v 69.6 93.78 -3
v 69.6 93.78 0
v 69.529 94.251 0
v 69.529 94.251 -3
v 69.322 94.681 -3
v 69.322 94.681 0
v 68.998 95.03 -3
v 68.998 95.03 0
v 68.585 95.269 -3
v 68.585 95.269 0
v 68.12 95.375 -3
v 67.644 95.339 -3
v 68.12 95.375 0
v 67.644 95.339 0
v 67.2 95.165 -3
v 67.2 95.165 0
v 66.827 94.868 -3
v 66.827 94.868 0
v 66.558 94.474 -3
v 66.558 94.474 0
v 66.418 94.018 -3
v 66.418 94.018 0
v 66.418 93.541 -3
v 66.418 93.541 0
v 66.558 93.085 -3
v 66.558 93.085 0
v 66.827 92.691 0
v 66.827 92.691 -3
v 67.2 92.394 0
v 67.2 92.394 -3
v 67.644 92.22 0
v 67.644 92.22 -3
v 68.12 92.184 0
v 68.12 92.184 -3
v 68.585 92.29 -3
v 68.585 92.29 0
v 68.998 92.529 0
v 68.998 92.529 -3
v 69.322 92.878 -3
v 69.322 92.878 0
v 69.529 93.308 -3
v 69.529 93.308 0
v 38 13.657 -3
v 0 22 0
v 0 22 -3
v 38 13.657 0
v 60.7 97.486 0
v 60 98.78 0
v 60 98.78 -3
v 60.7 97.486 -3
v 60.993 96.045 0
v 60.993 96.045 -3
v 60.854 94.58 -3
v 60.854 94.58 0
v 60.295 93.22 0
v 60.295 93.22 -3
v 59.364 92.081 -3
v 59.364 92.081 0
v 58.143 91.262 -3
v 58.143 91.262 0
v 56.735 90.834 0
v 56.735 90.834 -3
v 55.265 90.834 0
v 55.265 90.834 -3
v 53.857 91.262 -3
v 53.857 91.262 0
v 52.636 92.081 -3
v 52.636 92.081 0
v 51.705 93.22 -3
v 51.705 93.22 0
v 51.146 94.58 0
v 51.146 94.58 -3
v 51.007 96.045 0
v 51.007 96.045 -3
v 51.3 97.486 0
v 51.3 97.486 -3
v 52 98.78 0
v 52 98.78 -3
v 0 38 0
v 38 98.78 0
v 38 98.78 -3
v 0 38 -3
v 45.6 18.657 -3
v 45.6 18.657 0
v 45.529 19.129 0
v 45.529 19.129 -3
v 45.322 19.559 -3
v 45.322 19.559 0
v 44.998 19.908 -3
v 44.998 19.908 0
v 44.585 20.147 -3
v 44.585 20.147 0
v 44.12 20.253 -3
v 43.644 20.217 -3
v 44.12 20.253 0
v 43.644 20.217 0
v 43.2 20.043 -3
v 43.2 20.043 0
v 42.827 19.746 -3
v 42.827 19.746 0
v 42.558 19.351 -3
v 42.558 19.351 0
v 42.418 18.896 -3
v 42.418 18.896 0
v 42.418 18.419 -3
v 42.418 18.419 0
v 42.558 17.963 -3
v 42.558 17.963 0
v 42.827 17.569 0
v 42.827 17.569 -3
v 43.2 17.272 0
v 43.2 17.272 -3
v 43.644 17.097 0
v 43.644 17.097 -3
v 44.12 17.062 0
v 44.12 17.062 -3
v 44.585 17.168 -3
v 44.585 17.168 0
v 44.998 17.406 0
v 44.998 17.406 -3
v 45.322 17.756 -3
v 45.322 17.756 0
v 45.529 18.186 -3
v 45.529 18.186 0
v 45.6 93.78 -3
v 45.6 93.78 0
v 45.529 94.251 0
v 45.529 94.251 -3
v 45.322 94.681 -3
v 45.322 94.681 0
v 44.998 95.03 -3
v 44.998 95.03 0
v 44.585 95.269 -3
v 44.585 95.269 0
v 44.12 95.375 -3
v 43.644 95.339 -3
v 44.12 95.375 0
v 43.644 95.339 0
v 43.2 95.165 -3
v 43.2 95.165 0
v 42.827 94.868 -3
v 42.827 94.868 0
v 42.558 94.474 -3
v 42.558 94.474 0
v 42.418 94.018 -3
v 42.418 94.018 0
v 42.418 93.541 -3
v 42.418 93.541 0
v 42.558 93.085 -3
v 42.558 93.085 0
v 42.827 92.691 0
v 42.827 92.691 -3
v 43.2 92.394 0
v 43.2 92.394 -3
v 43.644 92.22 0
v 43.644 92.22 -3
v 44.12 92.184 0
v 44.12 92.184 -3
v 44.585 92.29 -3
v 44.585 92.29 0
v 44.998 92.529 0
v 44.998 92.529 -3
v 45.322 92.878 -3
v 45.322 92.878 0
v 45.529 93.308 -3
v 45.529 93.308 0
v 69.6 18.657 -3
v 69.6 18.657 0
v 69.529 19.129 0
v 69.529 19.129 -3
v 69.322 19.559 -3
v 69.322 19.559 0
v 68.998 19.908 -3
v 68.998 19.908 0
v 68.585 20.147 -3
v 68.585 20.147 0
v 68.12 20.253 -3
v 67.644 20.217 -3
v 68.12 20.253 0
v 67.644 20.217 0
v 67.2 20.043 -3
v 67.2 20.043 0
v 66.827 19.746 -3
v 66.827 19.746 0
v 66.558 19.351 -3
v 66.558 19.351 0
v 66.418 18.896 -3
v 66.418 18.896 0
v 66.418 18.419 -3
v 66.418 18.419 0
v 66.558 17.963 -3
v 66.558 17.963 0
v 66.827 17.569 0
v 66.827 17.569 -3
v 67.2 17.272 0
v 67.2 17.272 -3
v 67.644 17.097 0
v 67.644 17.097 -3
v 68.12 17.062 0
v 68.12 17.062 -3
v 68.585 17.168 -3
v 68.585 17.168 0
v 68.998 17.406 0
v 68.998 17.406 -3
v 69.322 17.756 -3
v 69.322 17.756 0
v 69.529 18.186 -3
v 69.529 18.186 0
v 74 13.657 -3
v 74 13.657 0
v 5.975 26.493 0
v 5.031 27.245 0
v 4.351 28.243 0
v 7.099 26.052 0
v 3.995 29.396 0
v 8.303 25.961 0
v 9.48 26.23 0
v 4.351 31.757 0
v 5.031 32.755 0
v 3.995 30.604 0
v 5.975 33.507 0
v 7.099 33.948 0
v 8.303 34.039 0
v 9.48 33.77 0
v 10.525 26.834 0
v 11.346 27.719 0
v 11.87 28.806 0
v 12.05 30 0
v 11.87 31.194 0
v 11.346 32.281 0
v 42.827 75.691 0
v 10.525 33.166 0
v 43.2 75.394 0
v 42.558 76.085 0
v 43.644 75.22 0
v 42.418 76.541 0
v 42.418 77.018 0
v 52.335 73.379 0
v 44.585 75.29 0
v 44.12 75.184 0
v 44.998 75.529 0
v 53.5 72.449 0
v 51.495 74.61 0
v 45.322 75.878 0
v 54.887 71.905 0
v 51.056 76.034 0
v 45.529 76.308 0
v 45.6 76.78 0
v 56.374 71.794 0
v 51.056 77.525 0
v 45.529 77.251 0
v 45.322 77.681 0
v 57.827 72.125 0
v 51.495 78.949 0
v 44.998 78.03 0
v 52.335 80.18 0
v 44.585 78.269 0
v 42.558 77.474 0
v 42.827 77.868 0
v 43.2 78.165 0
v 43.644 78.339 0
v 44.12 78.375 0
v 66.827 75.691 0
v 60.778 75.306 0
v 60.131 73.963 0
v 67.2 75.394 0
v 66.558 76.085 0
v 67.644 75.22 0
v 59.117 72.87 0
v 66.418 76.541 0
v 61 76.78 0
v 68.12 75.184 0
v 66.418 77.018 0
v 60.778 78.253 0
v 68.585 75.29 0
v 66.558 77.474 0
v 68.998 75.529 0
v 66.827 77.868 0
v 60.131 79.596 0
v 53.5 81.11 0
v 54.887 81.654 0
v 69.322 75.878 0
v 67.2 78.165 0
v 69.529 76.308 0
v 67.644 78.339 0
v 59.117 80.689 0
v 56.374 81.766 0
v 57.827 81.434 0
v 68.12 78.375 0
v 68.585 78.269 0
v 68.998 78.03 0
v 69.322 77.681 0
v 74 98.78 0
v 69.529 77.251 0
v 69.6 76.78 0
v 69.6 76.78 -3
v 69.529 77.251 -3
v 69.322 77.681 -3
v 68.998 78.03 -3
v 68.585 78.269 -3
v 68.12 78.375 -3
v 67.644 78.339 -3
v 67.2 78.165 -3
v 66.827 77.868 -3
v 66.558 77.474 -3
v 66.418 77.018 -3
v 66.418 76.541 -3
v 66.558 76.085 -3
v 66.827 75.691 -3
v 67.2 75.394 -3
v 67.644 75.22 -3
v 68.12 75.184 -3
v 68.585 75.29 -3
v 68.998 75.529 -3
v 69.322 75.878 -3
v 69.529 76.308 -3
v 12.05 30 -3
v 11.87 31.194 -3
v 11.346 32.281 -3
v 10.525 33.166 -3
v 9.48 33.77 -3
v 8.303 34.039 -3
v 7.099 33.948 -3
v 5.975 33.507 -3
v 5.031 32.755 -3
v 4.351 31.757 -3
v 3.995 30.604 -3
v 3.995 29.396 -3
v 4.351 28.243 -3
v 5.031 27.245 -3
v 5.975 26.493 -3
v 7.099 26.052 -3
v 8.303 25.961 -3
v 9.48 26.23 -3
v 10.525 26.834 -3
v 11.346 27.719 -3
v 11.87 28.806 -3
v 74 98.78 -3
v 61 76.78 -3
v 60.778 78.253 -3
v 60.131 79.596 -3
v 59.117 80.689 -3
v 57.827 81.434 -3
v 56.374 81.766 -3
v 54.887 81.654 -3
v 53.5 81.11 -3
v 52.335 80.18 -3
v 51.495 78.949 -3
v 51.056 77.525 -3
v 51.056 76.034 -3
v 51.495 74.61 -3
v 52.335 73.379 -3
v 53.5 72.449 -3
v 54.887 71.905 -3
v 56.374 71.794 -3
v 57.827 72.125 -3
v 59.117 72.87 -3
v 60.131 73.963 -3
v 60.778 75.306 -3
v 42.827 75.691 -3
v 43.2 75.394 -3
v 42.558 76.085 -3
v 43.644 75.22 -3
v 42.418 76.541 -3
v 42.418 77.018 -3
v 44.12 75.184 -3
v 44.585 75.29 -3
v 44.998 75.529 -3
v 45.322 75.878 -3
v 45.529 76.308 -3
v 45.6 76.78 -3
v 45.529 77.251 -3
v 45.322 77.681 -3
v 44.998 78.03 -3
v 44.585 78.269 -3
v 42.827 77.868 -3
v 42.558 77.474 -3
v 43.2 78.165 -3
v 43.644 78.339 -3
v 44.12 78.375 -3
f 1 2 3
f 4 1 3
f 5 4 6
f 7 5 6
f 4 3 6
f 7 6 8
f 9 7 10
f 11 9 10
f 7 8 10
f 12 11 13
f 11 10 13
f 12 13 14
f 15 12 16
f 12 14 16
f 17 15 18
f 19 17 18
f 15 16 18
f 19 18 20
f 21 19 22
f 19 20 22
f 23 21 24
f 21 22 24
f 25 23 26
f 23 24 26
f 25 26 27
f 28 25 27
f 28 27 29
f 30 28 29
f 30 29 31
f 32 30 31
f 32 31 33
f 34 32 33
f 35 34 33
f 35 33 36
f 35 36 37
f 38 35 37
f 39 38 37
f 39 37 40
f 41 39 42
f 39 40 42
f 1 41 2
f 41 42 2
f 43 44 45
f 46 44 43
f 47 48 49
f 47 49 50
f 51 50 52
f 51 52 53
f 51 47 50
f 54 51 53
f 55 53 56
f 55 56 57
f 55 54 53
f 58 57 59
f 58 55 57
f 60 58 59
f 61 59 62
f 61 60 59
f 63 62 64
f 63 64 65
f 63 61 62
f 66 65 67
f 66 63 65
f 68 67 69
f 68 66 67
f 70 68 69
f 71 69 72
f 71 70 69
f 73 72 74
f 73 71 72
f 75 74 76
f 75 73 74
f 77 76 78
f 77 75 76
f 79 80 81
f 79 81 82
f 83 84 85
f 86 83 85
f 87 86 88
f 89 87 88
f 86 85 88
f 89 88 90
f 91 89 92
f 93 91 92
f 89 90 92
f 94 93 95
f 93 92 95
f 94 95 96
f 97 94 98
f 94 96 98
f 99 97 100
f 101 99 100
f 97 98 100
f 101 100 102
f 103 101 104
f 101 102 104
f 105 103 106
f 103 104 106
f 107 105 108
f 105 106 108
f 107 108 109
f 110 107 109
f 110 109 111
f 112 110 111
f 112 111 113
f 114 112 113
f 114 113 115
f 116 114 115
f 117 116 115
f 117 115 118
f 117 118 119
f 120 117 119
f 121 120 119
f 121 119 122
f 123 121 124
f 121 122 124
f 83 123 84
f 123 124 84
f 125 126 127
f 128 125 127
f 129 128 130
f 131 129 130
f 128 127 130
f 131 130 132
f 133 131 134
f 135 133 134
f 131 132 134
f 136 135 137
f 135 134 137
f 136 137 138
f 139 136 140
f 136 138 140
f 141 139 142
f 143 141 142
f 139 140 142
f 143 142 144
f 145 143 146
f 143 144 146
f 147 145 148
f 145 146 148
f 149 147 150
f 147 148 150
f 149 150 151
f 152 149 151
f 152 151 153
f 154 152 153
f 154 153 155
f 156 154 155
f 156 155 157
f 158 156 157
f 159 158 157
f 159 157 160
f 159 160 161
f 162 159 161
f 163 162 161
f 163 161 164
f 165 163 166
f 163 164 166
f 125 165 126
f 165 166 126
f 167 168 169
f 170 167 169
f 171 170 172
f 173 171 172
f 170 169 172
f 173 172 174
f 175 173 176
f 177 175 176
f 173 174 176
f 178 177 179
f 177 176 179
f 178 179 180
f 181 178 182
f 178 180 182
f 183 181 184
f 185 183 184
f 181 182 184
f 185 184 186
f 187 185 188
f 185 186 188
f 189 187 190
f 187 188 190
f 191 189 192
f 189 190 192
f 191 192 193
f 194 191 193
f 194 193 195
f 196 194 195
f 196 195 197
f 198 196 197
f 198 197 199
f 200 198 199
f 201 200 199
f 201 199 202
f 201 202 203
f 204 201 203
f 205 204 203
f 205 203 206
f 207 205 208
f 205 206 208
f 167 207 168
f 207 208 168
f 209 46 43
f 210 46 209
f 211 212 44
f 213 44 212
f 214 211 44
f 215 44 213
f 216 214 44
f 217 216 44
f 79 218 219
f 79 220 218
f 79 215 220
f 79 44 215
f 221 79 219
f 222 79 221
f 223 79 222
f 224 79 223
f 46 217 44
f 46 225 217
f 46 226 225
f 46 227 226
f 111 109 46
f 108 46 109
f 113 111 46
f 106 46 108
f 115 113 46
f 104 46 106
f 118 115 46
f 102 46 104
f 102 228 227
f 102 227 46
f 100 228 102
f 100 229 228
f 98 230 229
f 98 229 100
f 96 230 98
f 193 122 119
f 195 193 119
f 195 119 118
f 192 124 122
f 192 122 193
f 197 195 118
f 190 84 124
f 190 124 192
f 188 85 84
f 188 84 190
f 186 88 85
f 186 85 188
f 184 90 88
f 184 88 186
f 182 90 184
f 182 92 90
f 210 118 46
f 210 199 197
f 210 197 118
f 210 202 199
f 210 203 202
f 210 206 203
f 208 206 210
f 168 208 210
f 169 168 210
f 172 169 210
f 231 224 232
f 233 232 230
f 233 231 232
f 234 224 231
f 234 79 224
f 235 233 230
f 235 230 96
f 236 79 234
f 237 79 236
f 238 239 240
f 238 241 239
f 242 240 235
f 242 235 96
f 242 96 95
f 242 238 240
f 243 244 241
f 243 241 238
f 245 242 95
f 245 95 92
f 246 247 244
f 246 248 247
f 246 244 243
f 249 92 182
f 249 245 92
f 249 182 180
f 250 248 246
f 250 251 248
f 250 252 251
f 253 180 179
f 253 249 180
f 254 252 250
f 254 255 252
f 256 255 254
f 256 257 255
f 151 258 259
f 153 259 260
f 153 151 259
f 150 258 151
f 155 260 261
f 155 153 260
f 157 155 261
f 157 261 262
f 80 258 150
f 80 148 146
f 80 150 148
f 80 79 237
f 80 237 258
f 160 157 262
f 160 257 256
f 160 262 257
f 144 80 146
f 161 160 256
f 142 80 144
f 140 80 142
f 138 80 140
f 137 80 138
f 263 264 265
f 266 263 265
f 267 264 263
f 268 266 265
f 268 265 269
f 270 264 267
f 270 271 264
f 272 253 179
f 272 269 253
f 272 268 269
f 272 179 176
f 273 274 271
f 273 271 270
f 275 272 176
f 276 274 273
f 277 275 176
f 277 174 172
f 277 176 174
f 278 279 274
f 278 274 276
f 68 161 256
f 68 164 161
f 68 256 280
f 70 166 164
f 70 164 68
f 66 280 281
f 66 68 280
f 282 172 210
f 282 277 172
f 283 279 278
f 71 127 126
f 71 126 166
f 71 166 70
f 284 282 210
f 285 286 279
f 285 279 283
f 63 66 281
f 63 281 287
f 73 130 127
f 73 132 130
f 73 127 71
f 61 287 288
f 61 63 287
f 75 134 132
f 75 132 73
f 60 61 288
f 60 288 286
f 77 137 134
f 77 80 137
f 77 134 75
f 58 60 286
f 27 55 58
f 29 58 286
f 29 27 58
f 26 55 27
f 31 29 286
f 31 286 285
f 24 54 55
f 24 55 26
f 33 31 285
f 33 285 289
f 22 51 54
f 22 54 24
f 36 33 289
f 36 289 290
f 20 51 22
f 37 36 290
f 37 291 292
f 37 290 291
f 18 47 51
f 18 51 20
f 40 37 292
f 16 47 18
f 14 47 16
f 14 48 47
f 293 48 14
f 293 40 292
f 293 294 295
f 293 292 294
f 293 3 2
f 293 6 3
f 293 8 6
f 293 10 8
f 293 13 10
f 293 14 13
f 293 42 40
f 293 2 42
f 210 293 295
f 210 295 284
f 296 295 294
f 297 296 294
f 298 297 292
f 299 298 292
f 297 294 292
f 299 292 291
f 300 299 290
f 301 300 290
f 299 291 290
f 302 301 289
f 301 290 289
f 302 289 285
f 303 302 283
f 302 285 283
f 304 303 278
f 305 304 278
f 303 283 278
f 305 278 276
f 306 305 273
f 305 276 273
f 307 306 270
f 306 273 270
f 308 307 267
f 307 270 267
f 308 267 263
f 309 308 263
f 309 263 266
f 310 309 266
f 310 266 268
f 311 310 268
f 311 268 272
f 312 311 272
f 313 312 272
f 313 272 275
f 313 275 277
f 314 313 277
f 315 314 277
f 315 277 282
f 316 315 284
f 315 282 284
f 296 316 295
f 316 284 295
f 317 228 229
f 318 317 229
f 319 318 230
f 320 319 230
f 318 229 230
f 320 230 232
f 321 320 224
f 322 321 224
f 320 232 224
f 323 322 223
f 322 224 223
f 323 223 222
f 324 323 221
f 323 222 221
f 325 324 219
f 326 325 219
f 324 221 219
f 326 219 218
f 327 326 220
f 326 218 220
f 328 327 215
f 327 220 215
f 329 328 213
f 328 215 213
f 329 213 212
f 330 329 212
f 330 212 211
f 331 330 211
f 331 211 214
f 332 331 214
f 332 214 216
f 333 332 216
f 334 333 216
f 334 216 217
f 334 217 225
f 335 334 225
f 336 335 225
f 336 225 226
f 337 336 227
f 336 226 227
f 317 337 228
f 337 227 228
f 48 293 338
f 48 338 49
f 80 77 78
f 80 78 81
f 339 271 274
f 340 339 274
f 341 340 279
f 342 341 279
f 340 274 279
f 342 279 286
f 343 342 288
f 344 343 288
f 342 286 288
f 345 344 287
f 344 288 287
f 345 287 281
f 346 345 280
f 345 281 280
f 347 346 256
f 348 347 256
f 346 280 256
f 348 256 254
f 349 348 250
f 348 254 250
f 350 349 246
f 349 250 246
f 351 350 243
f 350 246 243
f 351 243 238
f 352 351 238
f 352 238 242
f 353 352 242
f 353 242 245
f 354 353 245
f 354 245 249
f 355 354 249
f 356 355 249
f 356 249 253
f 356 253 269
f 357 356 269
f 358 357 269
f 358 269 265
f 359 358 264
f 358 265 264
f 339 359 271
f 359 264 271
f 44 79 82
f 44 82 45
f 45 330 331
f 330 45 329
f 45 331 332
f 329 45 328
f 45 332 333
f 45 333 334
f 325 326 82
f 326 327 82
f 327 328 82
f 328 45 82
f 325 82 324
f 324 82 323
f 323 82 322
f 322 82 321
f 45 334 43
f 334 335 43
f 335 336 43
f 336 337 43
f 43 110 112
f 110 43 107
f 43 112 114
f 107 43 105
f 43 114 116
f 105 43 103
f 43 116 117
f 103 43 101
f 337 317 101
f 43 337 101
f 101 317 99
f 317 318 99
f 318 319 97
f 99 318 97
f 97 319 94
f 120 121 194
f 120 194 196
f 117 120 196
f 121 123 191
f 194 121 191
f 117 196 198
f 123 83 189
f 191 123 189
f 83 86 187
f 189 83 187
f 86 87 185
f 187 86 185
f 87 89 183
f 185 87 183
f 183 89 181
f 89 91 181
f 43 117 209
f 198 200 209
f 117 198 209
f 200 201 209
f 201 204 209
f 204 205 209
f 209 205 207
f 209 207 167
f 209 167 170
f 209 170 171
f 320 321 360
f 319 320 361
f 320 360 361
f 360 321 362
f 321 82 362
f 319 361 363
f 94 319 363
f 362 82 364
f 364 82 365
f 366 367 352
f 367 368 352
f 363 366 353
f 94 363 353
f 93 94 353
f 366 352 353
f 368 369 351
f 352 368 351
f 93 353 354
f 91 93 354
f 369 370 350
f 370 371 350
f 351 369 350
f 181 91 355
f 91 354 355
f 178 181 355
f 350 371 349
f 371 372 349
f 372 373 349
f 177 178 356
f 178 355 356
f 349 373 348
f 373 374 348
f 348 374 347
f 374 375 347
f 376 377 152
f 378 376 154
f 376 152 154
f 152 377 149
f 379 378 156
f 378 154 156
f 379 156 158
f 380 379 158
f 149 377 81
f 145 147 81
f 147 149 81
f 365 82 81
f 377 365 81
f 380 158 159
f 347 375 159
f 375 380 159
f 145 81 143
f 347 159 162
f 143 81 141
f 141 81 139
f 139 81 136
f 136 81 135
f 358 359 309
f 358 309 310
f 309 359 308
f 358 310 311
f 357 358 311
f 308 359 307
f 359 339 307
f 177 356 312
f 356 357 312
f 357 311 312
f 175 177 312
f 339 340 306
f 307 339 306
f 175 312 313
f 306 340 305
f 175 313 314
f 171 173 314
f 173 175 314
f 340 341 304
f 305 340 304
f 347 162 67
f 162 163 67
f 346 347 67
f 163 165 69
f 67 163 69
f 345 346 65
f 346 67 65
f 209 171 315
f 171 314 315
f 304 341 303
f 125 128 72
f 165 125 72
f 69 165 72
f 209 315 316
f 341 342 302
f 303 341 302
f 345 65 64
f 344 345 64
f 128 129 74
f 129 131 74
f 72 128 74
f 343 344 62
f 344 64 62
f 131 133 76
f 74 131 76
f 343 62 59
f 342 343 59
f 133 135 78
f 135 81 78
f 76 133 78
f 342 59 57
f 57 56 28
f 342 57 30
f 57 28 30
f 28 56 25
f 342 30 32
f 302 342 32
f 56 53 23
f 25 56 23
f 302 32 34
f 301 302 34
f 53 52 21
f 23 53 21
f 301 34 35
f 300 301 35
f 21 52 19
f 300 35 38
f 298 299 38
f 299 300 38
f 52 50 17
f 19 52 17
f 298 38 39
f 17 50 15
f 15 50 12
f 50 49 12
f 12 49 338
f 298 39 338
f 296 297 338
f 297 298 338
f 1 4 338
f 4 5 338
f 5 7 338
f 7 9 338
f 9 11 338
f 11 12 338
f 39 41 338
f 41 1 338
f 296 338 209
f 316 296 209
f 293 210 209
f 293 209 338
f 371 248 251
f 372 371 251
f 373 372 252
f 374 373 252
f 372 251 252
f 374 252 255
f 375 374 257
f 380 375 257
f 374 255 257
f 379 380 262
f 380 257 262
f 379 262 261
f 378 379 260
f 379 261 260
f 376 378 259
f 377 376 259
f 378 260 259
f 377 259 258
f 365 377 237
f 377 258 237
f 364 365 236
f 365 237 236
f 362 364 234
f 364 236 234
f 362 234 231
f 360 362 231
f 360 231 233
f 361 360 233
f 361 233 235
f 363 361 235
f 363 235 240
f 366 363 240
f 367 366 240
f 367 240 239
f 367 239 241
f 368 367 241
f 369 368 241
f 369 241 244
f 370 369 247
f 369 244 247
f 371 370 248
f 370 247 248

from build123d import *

# Parameters (mm, degrees)
SKETCH_1_R      = 4.05
SKETCH_1_R_2    = 1.6
SKETCH_1_R_3    = 5
EXTRUDE_1_DEPTH = 3


with BuildPart() as part:
    # ｽｹｯﾁ1 → ﾎﾞｽ - 押し出し1 (new body)
    with BuildSketch(Plane.XY):
        with BuildLine():
            Line((74, 13.65722438), (74, 98.779537634))
            Line((74, 98.779537634), (60, 98.779537634))
            ThreePointArc((60, 98.779537634), (56, 90.779537634), (52, 98.779537634))
            Line((52, 98.779537634), (38, 98.779537634))
            Line((38, 98.779537634), (0, 38))
            Line((0, 38), (0, 22))
            Line((0, 22), (38, 13.65722438))
            Line((38, 13.65722438), (74, 13.65722438))
        make_face()
        with Locations((8, 30)):
            Circle(SKETCH_1_R, mode=Mode.SUBTRACT)
        with Locations((44, 18.65722438)):
            Circle(SKETCH_1_R_2, mode=Mode.SUBTRACT)
        with Locations((68, 18.65722438)):
            Circle(SKETCH_1_R_2, mode=Mode.SUBTRACT)
        with Locations((44, 76.779537634)):
            Circle(SKETCH_1_R_2, mode=Mode.SUBTRACT)
        with Locations((56, 76.779537634)):
            Circle(SKETCH_1_R_3, mode=Mode.SUBTRACT)
        with Locations((68, 76.779537634)):
            Circle(SKETCH_1_R_2, mode=Mode.SUBTRACT)
        with Locations((44, 93.779537634)):
            Circle(SKETCH_1_R_2, mode=Mode.SUBTRACT)
        with Locations((68, 93.779537634)):
            Circle(SKETCH_1_R_2, mode=Mode.SUBTRACT)
    extrude(amount=-EXTRUDE_1_DEPTH)


solid = part.part
